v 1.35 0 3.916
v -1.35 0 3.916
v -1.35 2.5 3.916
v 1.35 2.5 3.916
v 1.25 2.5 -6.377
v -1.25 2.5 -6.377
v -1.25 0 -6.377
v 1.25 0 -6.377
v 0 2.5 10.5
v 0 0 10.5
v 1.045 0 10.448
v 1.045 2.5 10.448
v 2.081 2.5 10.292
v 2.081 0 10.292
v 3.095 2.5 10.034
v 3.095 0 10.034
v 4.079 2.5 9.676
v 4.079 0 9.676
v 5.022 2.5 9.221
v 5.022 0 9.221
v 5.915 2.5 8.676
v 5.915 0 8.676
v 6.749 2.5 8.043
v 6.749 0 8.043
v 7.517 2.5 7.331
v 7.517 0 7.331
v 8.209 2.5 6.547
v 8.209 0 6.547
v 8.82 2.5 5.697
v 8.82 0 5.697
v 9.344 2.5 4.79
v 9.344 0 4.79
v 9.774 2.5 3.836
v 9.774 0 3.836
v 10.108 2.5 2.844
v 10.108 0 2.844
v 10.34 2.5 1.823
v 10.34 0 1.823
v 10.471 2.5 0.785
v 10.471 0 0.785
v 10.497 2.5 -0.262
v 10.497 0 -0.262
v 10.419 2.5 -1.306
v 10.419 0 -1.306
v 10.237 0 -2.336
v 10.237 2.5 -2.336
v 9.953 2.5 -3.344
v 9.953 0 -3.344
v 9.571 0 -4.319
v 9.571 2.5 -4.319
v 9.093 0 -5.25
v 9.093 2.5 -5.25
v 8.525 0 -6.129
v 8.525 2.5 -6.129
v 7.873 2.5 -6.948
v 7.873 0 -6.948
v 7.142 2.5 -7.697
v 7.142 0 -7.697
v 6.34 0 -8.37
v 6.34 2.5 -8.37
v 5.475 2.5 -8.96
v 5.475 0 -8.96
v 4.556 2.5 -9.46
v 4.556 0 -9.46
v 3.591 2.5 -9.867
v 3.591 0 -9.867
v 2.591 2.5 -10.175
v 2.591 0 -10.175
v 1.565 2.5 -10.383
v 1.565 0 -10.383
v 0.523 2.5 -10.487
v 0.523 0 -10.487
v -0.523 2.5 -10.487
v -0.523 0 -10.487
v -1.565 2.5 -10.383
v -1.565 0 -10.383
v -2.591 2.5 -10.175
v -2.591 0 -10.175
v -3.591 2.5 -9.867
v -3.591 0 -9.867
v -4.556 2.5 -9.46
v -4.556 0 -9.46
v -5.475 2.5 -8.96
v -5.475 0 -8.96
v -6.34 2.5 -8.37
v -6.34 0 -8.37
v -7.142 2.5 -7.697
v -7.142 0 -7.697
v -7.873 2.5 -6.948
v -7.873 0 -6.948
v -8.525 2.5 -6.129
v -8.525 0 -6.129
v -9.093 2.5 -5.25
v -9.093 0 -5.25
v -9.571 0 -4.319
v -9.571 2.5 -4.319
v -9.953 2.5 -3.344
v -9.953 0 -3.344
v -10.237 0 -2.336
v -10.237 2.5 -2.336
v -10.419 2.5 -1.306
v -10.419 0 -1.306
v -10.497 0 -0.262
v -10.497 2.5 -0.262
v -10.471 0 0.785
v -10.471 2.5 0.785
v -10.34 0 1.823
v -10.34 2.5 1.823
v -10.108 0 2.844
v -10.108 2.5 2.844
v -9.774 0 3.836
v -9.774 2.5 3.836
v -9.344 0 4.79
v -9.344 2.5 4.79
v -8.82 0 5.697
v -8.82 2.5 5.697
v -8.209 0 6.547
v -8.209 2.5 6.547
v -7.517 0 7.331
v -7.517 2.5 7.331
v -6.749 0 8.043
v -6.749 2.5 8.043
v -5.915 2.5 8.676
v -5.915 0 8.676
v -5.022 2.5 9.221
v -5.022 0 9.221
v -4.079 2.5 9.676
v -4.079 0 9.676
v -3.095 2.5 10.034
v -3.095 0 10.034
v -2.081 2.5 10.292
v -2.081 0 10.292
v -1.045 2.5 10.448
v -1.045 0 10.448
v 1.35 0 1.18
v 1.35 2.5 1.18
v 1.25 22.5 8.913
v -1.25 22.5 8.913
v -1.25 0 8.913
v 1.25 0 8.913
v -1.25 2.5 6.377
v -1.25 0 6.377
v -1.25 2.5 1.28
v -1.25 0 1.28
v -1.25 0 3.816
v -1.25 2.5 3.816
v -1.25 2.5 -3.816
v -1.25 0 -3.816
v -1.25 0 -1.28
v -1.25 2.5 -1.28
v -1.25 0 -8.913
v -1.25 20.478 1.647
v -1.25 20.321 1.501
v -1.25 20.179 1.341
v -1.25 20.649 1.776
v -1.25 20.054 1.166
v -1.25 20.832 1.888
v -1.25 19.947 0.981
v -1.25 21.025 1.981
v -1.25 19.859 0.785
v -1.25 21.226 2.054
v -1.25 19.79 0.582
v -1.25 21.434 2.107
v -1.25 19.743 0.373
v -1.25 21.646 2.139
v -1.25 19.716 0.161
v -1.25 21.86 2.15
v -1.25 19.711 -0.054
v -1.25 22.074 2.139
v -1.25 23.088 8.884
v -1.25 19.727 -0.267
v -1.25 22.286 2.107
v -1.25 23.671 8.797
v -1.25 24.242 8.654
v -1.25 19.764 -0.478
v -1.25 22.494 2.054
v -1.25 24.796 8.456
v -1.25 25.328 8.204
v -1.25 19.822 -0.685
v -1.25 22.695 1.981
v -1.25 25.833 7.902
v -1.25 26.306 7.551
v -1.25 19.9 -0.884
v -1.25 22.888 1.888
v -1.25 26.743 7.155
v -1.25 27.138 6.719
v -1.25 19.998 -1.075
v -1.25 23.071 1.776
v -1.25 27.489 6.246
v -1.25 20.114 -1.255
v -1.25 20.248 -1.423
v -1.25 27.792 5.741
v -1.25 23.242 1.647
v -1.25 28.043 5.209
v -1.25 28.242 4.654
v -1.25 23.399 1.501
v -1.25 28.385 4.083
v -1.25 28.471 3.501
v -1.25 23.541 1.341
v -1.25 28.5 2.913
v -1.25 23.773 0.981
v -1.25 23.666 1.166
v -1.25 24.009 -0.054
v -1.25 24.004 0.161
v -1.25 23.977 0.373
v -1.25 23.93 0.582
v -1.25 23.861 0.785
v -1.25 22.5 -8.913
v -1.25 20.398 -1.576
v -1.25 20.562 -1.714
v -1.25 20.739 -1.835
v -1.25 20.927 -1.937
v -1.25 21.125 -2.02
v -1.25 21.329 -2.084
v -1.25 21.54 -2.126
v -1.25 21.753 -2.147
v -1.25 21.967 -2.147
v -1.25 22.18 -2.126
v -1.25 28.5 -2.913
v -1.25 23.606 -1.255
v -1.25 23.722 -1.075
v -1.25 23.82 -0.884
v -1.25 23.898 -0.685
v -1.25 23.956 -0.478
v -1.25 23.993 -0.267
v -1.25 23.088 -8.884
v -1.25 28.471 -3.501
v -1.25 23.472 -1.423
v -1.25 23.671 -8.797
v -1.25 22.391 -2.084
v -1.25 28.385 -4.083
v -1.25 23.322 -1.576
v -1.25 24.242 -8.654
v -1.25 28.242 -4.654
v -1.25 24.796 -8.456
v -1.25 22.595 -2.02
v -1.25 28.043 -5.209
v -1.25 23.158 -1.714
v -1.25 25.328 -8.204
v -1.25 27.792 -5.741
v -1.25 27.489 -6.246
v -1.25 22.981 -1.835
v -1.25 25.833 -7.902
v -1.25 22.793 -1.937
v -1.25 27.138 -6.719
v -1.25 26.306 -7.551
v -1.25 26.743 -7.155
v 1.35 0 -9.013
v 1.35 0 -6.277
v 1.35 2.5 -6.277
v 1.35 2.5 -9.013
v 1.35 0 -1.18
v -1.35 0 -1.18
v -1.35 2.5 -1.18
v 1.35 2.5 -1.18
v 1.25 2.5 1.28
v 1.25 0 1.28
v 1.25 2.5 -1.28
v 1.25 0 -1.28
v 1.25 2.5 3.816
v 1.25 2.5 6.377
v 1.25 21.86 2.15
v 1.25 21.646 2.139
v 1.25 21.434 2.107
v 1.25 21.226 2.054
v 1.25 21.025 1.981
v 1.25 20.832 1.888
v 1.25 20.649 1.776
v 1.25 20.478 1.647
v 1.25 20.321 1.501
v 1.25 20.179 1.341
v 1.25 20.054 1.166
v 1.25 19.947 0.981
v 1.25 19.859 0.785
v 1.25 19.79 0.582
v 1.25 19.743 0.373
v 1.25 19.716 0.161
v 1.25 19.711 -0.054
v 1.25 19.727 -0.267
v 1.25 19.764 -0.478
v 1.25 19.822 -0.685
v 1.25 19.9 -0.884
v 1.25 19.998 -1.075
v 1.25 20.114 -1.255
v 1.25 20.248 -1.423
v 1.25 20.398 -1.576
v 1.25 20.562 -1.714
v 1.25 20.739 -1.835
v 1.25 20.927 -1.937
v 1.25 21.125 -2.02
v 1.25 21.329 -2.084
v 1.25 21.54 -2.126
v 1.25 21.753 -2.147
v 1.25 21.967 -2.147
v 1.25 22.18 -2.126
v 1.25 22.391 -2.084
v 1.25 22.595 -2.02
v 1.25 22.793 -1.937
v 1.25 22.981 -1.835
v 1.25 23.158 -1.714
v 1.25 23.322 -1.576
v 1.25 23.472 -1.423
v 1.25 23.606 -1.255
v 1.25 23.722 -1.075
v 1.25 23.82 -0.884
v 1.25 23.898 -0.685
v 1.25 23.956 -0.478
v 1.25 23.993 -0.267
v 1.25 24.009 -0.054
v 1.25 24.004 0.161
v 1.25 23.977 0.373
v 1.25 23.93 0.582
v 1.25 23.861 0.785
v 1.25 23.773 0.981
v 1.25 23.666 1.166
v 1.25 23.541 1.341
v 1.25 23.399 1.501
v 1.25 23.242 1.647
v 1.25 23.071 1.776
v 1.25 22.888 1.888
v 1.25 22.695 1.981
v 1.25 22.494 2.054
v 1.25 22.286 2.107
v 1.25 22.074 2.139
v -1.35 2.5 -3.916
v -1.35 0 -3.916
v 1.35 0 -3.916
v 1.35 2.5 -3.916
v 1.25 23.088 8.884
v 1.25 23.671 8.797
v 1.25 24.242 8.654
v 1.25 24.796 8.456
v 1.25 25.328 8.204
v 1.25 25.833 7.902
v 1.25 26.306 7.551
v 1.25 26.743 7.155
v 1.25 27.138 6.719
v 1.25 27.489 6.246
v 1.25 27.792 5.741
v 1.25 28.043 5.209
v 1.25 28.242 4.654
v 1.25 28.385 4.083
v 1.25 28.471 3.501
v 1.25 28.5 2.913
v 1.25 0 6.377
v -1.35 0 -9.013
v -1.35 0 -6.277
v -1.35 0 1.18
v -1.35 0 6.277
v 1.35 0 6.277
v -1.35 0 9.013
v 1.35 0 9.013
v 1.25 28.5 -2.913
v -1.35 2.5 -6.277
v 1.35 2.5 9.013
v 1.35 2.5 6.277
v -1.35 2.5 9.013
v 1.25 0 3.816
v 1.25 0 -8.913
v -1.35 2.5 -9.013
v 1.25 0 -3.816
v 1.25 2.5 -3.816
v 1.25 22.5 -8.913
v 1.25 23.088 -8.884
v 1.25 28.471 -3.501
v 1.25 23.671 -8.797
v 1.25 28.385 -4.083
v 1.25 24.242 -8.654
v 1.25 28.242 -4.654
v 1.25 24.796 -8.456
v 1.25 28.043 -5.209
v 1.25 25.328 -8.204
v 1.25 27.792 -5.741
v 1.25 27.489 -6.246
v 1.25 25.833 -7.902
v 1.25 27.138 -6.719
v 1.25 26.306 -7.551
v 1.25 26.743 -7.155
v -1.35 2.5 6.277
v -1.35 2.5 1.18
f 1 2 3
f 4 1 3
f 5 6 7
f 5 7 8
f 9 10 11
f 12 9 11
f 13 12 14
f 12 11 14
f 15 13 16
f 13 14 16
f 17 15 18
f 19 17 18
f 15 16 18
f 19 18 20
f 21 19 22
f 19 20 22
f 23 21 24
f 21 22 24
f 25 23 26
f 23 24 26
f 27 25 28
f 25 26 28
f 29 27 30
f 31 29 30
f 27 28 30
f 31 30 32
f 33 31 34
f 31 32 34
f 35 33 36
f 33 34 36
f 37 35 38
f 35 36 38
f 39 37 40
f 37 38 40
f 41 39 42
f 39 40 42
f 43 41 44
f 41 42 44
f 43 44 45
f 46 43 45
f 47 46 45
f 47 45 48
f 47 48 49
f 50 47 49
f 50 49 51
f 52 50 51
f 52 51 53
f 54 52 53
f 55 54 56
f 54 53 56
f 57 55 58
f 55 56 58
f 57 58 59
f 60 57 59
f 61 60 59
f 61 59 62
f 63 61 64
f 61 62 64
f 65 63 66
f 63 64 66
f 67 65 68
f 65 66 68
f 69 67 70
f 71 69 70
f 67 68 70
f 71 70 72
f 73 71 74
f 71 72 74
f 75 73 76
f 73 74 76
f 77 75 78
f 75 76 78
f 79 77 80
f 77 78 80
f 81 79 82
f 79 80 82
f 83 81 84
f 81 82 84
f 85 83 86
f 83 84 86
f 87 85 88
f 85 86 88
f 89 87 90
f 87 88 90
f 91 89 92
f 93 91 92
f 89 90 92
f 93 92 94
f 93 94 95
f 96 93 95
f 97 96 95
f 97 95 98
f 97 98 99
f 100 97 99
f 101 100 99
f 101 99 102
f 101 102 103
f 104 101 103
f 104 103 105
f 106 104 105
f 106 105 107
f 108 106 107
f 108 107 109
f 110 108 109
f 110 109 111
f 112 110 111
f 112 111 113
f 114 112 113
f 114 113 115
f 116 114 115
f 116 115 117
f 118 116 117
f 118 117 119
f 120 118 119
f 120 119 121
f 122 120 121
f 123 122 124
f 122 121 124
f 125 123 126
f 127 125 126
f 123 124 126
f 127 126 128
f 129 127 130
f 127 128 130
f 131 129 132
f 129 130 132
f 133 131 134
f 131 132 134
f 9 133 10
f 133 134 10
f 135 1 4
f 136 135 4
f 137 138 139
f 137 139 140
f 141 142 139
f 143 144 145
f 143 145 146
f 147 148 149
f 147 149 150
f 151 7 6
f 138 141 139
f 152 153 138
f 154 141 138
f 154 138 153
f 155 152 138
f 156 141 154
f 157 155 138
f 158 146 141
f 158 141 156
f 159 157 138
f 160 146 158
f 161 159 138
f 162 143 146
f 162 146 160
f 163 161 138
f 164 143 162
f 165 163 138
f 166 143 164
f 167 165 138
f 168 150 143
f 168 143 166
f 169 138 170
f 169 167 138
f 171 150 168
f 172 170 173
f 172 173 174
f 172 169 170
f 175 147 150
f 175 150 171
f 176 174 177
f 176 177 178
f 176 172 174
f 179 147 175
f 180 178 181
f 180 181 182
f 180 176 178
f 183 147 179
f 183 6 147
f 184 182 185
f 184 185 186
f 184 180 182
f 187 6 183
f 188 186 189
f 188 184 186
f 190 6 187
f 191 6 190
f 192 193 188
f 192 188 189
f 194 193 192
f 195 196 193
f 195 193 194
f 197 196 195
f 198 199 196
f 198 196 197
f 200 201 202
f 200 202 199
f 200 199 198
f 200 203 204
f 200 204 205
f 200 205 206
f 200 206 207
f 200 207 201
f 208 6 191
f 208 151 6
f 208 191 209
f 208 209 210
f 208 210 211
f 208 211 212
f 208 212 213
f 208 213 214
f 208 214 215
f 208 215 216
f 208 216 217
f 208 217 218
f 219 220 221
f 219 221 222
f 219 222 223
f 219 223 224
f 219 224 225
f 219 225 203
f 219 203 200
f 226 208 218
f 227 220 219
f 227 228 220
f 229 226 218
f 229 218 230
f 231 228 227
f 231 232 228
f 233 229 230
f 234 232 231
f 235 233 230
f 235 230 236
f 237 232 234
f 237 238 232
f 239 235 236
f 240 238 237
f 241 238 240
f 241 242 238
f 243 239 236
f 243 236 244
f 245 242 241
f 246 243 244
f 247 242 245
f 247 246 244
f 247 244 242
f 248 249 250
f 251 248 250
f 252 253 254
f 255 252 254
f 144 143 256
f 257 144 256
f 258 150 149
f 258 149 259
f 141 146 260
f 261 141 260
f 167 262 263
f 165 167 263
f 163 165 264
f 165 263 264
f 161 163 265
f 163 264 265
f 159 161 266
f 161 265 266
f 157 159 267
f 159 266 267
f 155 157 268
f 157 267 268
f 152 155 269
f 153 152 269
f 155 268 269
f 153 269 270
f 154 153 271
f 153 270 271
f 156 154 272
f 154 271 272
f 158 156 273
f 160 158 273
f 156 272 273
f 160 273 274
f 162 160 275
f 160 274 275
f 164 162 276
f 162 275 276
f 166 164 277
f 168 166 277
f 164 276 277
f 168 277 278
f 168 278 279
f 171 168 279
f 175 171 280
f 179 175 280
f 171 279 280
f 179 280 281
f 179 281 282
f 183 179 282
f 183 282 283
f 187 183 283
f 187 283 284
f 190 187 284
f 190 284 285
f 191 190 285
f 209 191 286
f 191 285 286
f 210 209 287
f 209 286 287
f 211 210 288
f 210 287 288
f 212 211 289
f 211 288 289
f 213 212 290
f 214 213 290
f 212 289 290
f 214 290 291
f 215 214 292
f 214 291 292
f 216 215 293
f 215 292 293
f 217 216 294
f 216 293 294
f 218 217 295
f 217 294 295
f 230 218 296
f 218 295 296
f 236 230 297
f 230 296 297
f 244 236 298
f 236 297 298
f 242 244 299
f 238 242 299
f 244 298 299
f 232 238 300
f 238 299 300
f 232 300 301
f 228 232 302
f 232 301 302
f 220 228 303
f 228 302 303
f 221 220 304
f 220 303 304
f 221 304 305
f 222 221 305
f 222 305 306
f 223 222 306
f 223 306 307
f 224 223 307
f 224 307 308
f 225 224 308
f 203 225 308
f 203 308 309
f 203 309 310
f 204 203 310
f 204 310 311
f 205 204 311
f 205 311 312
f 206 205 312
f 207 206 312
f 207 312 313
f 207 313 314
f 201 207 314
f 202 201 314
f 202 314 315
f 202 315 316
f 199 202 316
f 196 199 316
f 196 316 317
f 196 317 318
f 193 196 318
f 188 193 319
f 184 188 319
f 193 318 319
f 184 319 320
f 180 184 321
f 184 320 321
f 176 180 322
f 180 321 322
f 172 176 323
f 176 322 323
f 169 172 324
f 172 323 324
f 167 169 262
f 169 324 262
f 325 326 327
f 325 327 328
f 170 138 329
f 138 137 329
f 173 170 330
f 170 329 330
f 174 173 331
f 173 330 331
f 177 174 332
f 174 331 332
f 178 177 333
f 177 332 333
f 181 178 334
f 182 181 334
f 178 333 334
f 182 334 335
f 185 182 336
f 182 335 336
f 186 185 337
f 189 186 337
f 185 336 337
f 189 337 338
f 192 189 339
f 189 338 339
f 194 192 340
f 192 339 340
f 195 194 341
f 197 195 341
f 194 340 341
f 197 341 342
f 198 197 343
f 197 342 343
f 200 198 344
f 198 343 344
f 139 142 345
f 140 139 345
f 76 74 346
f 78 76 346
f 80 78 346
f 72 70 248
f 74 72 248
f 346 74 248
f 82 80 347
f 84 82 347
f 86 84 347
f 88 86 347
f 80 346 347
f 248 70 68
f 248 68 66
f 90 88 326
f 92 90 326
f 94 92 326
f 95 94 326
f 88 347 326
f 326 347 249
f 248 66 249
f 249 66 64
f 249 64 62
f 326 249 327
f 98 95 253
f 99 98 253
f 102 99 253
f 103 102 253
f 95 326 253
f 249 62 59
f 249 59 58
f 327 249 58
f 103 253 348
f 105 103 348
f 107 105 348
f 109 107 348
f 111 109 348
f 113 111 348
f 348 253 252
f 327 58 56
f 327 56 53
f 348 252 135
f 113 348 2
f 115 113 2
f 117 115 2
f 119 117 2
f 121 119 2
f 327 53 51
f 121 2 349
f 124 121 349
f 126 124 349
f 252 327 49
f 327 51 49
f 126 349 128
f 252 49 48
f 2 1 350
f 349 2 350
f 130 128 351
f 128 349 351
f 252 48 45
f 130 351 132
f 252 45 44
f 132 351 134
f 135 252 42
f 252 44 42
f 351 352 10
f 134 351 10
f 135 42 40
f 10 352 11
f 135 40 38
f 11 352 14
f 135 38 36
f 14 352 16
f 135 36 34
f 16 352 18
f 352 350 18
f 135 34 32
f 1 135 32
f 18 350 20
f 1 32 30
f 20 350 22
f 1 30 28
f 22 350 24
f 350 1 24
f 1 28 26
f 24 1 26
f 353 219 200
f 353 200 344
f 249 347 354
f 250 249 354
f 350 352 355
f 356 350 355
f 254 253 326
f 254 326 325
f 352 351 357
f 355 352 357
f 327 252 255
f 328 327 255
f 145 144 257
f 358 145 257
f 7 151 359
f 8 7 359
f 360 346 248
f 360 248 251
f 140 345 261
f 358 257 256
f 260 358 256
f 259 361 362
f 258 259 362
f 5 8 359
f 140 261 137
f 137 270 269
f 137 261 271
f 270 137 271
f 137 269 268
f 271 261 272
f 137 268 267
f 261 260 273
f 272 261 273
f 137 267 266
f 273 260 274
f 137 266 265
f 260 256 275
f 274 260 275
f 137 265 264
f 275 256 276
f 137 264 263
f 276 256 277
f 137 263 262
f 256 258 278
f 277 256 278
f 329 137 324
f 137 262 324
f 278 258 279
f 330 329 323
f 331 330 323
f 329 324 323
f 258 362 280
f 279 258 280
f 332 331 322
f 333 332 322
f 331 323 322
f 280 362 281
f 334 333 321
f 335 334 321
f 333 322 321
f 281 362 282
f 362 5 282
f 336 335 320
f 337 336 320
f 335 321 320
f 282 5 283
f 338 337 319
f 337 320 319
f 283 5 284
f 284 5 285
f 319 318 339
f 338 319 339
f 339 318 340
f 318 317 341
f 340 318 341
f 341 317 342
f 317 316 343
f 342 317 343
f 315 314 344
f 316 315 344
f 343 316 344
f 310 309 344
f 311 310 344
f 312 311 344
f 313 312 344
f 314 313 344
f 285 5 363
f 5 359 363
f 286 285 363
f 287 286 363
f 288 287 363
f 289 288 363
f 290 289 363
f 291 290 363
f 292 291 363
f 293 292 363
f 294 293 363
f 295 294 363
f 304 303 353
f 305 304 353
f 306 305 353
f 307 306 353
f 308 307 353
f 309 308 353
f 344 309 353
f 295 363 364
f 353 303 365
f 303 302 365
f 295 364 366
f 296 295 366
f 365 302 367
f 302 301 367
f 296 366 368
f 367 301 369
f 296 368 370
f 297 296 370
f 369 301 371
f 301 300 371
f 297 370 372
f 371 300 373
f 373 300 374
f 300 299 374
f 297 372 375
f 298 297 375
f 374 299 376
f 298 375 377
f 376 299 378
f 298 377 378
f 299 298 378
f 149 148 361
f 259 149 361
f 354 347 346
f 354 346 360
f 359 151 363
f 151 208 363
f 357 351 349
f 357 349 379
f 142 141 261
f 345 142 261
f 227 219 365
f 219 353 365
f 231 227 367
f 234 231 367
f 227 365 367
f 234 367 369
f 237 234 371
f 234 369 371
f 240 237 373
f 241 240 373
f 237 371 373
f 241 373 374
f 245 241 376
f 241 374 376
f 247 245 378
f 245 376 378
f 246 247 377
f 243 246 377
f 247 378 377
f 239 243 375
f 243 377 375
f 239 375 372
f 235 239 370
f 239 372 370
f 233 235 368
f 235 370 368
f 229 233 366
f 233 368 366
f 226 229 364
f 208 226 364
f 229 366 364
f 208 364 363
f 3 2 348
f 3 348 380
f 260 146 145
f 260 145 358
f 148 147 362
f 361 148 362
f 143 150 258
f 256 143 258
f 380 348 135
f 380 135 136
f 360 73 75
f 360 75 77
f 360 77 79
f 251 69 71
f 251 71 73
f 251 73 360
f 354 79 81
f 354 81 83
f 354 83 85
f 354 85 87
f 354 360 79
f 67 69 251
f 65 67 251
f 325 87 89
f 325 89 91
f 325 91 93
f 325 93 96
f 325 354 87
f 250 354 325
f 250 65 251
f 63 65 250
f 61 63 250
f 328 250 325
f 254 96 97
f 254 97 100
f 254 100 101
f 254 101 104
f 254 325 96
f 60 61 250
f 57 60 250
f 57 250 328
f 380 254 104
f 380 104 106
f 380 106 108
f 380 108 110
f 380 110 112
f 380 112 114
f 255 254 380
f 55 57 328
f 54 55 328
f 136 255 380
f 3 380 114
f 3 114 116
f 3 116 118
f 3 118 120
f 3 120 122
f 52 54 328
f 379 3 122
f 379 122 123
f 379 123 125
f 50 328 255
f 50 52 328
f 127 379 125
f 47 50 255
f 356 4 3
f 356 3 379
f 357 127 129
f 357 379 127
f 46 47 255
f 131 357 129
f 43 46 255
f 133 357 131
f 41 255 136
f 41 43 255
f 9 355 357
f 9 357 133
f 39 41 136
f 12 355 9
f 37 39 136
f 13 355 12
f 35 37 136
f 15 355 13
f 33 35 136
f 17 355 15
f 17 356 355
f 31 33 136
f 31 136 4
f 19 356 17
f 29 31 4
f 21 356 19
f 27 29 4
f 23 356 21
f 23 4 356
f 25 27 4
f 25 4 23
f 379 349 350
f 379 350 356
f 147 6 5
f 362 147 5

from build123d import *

# Parameters (mm, degrees)
SKETCH1_R                     = 10.5
BOSS_EXTRUDE1_DEPTH           = 2.5
SKETCH2_W                     = 2.5
SKETCH2_H                     = 17.82554347
BOSS_EXTRUDE2_DEPTH           = 26
SKETCH5_W                     = 2.15
SKETCH5_H                     = 11.75
FILLET1_R                     = 6
TAB_START                     = -8.912771735
TAB_AND_SLOT_TAB1_OUTLINE_W   = 2.5
TAB_AND_SLOT_TAB1_OUTLINE_H   = 2.5
TAB_AND_SLOT_TAB1_DEPTH       = 2.535714286
TAB_START_2                   = -3.816162007
TAB_AND_SLOT_TAB1_2_OUTLINE_W = 2.5
TAB_AND_SLOT_TAB1_2_OUTLINE_H = 2.5
TAB_AND_SLOT_TAB1_2_DEPTH     = 2.535714286
TAB_START_3                   = 1.280447721
TAB_AND_SLOT_TAB1_3_OUTLINE_W = 2.5
TAB_AND_SLOT_TAB1_3_OUTLINE_H = 2.5
TAB_AND_SLOT_TAB1_3_DEPTH     = 2.535714286
TAB_START_4                   = 6.377057449
TAB_AND_SLOT_TAB1_4_OUTLINE_W = 2.5
TAB_AND_SLOT_TAB1_4_OUTLINE_H = 2.5
TAB_AND_SLOT_TAB1_4_DEPTH     = 2.535714286
TAB_START_5                   = -1.35
TAB_AND_SLOT_SLOT1_OUTLINE_W  = 2.5
TAB_AND_SLOT_SLOT1_OUTLINE_H  = 2.735714286
TAB_AND_SLOT_SLOT1_DEPTH      = 2.7


with BuildPart() as part:
    # Sketch1 → Boss-Extrude1 (new body)
    with BuildSketch(Plane(origin=(0, 0, 0), x_dir=(1, 0, 0), z_dir=(0, 1, 0))):
        with Locations(Location((0, 0, 0), (0, 0, 270))):
            Circle(SKETCH1_R)
    extrude(amount=BOSS_EXTRUDE1_DEPTH)

    # Tab and Slot-Slot1: read off the stored shape, not the designer's step
    # Tab and Slot-Slot1 outline → Tab and Slot-Slot1 (cut)
    with BuildSketch(Plane.YZ.offset(TAB_START_5)):
        with Locations((1.25, -7.644914592)):
            Rectangle(TAB_AND_SLOT_SLOT1_OUTLINE_W, TAB_AND_SLOT_SLOT1_OUTLINE_H)
        with Locations((1.25, -2.548304864)):
            Rectangle(TAB_AND_SLOT_SLOT1_OUTLINE_W, TAB_AND_SLOT_SLOT1_OUTLINE_H)
        with Locations((1.25, 2.548304864)):
            Rectangle(TAB_AND_SLOT_SLOT1_OUTLINE_W, TAB_AND_SLOT_SLOT1_OUTLINE_H)
        with Locations((1.25, 7.644914592)):
            Rectangle(TAB_AND_SLOT_SLOT1_OUTLINE_W, TAB_AND_SLOT_SLOT1_OUTLINE_H)
    extrude(amount=TAB_AND_SLOT_SLOT1_DEPTH, mode=Mode.SUBTRACT)


with BuildPart() as body_2:
    # Sketch2 → Boss-Extrude2 (new body)
    with BuildSketch(Plane(origin=(0, 2.5, 0), x_dir=(1, 0, 0), z_dir=(0, 1, 0))):
        Rectangle(SKETCH2_W, SKETCH2_H)
    extrude(amount=BOSS_EXTRUDE2_DEPTH)

    # Sketch5 → M4 Clearance Hole1 (revolve, cut)
    with BuildSketch(Plane(origin=(-1.25, 21.86, 0), x_dir=(0, 0, 1), z_dir=(0, 1, 0))):
        with Locations((1.075, 5.875)):
            Rectangle(SKETCH5_W, SKETCH5_H)
    revolve(axis=Axis((-7.6, 21.86, 0), (1, 0, 0)), mode=Mode.SUBTRACT)

    # Fillet1
    fillet1_edges = [body_2.edges().sort_by_distance(p)[0] for p in [
        (0, 28.5, -8.912771735),
        (0, 28.5, 8.912771735),
    ]]
    fillet(fillet1_edges, radius=FILLET1_R)

    # Tab and Slot-Tab1: read off the stored shape, not the designer's step
    # Tab and Slot-Tab1 outline → Tab and Slot-Tab1 (add)
    with BuildSketch(Plane.XY.offset(TAB_START)):
        with Locations((0, 1.25)):
            Rectangle(TAB_AND_SLOT_TAB1_OUTLINE_W, TAB_AND_SLOT_TAB1_OUTLINE_H)
    extrude(amount=TAB_AND_SLOT_TAB1_DEPTH)

    # Tab and Slot-Tab1 2 outline → Tab and Slot-Tab1 2 (add)
    with BuildSketch(Plane.XY.offset(TAB_START_2)):
        with Locations((0, 1.25)):
            Rectangle(TAB_AND_SLOT_TAB1_2_OUTLINE_W, TAB_AND_SLOT_TAB1_2_OUTLINE_H)
    extrude(amount=TAB_AND_SLOT_TAB1_2_DEPTH)

    # Tab and Slot-Tab1 3 outline → Tab and Slot-Tab1 3 (add)
    with BuildSketch(Plane.XY.offset(TAB_START_3)):
        with Locations((0, 1.25)):
            Rectangle(TAB_AND_SLOT_TAB1_3_OUTLINE_W, TAB_AND_SLOT_TAB1_3_OUTLINE_H)
    extrude(amount=TAB_AND_SLOT_TAB1_3_DEPTH)

    # Tab and Slot-Tab1 4 outline → Tab and Slot-Tab1 4 (add)
    with BuildSketch(Plane.XY.offset(TAB_START_4)):
        with Locations((0, 1.25)):
            Rectangle(TAB_AND_SLOT_TAB1_4_OUTLINE_W, TAB_AND_SLOT_TAB1_4_OUTLINE_H)
    extrude(amount=TAB_AND_SLOT_TAB1_4_DEPTH)


solid = Compound([part.part, body_2.part])
